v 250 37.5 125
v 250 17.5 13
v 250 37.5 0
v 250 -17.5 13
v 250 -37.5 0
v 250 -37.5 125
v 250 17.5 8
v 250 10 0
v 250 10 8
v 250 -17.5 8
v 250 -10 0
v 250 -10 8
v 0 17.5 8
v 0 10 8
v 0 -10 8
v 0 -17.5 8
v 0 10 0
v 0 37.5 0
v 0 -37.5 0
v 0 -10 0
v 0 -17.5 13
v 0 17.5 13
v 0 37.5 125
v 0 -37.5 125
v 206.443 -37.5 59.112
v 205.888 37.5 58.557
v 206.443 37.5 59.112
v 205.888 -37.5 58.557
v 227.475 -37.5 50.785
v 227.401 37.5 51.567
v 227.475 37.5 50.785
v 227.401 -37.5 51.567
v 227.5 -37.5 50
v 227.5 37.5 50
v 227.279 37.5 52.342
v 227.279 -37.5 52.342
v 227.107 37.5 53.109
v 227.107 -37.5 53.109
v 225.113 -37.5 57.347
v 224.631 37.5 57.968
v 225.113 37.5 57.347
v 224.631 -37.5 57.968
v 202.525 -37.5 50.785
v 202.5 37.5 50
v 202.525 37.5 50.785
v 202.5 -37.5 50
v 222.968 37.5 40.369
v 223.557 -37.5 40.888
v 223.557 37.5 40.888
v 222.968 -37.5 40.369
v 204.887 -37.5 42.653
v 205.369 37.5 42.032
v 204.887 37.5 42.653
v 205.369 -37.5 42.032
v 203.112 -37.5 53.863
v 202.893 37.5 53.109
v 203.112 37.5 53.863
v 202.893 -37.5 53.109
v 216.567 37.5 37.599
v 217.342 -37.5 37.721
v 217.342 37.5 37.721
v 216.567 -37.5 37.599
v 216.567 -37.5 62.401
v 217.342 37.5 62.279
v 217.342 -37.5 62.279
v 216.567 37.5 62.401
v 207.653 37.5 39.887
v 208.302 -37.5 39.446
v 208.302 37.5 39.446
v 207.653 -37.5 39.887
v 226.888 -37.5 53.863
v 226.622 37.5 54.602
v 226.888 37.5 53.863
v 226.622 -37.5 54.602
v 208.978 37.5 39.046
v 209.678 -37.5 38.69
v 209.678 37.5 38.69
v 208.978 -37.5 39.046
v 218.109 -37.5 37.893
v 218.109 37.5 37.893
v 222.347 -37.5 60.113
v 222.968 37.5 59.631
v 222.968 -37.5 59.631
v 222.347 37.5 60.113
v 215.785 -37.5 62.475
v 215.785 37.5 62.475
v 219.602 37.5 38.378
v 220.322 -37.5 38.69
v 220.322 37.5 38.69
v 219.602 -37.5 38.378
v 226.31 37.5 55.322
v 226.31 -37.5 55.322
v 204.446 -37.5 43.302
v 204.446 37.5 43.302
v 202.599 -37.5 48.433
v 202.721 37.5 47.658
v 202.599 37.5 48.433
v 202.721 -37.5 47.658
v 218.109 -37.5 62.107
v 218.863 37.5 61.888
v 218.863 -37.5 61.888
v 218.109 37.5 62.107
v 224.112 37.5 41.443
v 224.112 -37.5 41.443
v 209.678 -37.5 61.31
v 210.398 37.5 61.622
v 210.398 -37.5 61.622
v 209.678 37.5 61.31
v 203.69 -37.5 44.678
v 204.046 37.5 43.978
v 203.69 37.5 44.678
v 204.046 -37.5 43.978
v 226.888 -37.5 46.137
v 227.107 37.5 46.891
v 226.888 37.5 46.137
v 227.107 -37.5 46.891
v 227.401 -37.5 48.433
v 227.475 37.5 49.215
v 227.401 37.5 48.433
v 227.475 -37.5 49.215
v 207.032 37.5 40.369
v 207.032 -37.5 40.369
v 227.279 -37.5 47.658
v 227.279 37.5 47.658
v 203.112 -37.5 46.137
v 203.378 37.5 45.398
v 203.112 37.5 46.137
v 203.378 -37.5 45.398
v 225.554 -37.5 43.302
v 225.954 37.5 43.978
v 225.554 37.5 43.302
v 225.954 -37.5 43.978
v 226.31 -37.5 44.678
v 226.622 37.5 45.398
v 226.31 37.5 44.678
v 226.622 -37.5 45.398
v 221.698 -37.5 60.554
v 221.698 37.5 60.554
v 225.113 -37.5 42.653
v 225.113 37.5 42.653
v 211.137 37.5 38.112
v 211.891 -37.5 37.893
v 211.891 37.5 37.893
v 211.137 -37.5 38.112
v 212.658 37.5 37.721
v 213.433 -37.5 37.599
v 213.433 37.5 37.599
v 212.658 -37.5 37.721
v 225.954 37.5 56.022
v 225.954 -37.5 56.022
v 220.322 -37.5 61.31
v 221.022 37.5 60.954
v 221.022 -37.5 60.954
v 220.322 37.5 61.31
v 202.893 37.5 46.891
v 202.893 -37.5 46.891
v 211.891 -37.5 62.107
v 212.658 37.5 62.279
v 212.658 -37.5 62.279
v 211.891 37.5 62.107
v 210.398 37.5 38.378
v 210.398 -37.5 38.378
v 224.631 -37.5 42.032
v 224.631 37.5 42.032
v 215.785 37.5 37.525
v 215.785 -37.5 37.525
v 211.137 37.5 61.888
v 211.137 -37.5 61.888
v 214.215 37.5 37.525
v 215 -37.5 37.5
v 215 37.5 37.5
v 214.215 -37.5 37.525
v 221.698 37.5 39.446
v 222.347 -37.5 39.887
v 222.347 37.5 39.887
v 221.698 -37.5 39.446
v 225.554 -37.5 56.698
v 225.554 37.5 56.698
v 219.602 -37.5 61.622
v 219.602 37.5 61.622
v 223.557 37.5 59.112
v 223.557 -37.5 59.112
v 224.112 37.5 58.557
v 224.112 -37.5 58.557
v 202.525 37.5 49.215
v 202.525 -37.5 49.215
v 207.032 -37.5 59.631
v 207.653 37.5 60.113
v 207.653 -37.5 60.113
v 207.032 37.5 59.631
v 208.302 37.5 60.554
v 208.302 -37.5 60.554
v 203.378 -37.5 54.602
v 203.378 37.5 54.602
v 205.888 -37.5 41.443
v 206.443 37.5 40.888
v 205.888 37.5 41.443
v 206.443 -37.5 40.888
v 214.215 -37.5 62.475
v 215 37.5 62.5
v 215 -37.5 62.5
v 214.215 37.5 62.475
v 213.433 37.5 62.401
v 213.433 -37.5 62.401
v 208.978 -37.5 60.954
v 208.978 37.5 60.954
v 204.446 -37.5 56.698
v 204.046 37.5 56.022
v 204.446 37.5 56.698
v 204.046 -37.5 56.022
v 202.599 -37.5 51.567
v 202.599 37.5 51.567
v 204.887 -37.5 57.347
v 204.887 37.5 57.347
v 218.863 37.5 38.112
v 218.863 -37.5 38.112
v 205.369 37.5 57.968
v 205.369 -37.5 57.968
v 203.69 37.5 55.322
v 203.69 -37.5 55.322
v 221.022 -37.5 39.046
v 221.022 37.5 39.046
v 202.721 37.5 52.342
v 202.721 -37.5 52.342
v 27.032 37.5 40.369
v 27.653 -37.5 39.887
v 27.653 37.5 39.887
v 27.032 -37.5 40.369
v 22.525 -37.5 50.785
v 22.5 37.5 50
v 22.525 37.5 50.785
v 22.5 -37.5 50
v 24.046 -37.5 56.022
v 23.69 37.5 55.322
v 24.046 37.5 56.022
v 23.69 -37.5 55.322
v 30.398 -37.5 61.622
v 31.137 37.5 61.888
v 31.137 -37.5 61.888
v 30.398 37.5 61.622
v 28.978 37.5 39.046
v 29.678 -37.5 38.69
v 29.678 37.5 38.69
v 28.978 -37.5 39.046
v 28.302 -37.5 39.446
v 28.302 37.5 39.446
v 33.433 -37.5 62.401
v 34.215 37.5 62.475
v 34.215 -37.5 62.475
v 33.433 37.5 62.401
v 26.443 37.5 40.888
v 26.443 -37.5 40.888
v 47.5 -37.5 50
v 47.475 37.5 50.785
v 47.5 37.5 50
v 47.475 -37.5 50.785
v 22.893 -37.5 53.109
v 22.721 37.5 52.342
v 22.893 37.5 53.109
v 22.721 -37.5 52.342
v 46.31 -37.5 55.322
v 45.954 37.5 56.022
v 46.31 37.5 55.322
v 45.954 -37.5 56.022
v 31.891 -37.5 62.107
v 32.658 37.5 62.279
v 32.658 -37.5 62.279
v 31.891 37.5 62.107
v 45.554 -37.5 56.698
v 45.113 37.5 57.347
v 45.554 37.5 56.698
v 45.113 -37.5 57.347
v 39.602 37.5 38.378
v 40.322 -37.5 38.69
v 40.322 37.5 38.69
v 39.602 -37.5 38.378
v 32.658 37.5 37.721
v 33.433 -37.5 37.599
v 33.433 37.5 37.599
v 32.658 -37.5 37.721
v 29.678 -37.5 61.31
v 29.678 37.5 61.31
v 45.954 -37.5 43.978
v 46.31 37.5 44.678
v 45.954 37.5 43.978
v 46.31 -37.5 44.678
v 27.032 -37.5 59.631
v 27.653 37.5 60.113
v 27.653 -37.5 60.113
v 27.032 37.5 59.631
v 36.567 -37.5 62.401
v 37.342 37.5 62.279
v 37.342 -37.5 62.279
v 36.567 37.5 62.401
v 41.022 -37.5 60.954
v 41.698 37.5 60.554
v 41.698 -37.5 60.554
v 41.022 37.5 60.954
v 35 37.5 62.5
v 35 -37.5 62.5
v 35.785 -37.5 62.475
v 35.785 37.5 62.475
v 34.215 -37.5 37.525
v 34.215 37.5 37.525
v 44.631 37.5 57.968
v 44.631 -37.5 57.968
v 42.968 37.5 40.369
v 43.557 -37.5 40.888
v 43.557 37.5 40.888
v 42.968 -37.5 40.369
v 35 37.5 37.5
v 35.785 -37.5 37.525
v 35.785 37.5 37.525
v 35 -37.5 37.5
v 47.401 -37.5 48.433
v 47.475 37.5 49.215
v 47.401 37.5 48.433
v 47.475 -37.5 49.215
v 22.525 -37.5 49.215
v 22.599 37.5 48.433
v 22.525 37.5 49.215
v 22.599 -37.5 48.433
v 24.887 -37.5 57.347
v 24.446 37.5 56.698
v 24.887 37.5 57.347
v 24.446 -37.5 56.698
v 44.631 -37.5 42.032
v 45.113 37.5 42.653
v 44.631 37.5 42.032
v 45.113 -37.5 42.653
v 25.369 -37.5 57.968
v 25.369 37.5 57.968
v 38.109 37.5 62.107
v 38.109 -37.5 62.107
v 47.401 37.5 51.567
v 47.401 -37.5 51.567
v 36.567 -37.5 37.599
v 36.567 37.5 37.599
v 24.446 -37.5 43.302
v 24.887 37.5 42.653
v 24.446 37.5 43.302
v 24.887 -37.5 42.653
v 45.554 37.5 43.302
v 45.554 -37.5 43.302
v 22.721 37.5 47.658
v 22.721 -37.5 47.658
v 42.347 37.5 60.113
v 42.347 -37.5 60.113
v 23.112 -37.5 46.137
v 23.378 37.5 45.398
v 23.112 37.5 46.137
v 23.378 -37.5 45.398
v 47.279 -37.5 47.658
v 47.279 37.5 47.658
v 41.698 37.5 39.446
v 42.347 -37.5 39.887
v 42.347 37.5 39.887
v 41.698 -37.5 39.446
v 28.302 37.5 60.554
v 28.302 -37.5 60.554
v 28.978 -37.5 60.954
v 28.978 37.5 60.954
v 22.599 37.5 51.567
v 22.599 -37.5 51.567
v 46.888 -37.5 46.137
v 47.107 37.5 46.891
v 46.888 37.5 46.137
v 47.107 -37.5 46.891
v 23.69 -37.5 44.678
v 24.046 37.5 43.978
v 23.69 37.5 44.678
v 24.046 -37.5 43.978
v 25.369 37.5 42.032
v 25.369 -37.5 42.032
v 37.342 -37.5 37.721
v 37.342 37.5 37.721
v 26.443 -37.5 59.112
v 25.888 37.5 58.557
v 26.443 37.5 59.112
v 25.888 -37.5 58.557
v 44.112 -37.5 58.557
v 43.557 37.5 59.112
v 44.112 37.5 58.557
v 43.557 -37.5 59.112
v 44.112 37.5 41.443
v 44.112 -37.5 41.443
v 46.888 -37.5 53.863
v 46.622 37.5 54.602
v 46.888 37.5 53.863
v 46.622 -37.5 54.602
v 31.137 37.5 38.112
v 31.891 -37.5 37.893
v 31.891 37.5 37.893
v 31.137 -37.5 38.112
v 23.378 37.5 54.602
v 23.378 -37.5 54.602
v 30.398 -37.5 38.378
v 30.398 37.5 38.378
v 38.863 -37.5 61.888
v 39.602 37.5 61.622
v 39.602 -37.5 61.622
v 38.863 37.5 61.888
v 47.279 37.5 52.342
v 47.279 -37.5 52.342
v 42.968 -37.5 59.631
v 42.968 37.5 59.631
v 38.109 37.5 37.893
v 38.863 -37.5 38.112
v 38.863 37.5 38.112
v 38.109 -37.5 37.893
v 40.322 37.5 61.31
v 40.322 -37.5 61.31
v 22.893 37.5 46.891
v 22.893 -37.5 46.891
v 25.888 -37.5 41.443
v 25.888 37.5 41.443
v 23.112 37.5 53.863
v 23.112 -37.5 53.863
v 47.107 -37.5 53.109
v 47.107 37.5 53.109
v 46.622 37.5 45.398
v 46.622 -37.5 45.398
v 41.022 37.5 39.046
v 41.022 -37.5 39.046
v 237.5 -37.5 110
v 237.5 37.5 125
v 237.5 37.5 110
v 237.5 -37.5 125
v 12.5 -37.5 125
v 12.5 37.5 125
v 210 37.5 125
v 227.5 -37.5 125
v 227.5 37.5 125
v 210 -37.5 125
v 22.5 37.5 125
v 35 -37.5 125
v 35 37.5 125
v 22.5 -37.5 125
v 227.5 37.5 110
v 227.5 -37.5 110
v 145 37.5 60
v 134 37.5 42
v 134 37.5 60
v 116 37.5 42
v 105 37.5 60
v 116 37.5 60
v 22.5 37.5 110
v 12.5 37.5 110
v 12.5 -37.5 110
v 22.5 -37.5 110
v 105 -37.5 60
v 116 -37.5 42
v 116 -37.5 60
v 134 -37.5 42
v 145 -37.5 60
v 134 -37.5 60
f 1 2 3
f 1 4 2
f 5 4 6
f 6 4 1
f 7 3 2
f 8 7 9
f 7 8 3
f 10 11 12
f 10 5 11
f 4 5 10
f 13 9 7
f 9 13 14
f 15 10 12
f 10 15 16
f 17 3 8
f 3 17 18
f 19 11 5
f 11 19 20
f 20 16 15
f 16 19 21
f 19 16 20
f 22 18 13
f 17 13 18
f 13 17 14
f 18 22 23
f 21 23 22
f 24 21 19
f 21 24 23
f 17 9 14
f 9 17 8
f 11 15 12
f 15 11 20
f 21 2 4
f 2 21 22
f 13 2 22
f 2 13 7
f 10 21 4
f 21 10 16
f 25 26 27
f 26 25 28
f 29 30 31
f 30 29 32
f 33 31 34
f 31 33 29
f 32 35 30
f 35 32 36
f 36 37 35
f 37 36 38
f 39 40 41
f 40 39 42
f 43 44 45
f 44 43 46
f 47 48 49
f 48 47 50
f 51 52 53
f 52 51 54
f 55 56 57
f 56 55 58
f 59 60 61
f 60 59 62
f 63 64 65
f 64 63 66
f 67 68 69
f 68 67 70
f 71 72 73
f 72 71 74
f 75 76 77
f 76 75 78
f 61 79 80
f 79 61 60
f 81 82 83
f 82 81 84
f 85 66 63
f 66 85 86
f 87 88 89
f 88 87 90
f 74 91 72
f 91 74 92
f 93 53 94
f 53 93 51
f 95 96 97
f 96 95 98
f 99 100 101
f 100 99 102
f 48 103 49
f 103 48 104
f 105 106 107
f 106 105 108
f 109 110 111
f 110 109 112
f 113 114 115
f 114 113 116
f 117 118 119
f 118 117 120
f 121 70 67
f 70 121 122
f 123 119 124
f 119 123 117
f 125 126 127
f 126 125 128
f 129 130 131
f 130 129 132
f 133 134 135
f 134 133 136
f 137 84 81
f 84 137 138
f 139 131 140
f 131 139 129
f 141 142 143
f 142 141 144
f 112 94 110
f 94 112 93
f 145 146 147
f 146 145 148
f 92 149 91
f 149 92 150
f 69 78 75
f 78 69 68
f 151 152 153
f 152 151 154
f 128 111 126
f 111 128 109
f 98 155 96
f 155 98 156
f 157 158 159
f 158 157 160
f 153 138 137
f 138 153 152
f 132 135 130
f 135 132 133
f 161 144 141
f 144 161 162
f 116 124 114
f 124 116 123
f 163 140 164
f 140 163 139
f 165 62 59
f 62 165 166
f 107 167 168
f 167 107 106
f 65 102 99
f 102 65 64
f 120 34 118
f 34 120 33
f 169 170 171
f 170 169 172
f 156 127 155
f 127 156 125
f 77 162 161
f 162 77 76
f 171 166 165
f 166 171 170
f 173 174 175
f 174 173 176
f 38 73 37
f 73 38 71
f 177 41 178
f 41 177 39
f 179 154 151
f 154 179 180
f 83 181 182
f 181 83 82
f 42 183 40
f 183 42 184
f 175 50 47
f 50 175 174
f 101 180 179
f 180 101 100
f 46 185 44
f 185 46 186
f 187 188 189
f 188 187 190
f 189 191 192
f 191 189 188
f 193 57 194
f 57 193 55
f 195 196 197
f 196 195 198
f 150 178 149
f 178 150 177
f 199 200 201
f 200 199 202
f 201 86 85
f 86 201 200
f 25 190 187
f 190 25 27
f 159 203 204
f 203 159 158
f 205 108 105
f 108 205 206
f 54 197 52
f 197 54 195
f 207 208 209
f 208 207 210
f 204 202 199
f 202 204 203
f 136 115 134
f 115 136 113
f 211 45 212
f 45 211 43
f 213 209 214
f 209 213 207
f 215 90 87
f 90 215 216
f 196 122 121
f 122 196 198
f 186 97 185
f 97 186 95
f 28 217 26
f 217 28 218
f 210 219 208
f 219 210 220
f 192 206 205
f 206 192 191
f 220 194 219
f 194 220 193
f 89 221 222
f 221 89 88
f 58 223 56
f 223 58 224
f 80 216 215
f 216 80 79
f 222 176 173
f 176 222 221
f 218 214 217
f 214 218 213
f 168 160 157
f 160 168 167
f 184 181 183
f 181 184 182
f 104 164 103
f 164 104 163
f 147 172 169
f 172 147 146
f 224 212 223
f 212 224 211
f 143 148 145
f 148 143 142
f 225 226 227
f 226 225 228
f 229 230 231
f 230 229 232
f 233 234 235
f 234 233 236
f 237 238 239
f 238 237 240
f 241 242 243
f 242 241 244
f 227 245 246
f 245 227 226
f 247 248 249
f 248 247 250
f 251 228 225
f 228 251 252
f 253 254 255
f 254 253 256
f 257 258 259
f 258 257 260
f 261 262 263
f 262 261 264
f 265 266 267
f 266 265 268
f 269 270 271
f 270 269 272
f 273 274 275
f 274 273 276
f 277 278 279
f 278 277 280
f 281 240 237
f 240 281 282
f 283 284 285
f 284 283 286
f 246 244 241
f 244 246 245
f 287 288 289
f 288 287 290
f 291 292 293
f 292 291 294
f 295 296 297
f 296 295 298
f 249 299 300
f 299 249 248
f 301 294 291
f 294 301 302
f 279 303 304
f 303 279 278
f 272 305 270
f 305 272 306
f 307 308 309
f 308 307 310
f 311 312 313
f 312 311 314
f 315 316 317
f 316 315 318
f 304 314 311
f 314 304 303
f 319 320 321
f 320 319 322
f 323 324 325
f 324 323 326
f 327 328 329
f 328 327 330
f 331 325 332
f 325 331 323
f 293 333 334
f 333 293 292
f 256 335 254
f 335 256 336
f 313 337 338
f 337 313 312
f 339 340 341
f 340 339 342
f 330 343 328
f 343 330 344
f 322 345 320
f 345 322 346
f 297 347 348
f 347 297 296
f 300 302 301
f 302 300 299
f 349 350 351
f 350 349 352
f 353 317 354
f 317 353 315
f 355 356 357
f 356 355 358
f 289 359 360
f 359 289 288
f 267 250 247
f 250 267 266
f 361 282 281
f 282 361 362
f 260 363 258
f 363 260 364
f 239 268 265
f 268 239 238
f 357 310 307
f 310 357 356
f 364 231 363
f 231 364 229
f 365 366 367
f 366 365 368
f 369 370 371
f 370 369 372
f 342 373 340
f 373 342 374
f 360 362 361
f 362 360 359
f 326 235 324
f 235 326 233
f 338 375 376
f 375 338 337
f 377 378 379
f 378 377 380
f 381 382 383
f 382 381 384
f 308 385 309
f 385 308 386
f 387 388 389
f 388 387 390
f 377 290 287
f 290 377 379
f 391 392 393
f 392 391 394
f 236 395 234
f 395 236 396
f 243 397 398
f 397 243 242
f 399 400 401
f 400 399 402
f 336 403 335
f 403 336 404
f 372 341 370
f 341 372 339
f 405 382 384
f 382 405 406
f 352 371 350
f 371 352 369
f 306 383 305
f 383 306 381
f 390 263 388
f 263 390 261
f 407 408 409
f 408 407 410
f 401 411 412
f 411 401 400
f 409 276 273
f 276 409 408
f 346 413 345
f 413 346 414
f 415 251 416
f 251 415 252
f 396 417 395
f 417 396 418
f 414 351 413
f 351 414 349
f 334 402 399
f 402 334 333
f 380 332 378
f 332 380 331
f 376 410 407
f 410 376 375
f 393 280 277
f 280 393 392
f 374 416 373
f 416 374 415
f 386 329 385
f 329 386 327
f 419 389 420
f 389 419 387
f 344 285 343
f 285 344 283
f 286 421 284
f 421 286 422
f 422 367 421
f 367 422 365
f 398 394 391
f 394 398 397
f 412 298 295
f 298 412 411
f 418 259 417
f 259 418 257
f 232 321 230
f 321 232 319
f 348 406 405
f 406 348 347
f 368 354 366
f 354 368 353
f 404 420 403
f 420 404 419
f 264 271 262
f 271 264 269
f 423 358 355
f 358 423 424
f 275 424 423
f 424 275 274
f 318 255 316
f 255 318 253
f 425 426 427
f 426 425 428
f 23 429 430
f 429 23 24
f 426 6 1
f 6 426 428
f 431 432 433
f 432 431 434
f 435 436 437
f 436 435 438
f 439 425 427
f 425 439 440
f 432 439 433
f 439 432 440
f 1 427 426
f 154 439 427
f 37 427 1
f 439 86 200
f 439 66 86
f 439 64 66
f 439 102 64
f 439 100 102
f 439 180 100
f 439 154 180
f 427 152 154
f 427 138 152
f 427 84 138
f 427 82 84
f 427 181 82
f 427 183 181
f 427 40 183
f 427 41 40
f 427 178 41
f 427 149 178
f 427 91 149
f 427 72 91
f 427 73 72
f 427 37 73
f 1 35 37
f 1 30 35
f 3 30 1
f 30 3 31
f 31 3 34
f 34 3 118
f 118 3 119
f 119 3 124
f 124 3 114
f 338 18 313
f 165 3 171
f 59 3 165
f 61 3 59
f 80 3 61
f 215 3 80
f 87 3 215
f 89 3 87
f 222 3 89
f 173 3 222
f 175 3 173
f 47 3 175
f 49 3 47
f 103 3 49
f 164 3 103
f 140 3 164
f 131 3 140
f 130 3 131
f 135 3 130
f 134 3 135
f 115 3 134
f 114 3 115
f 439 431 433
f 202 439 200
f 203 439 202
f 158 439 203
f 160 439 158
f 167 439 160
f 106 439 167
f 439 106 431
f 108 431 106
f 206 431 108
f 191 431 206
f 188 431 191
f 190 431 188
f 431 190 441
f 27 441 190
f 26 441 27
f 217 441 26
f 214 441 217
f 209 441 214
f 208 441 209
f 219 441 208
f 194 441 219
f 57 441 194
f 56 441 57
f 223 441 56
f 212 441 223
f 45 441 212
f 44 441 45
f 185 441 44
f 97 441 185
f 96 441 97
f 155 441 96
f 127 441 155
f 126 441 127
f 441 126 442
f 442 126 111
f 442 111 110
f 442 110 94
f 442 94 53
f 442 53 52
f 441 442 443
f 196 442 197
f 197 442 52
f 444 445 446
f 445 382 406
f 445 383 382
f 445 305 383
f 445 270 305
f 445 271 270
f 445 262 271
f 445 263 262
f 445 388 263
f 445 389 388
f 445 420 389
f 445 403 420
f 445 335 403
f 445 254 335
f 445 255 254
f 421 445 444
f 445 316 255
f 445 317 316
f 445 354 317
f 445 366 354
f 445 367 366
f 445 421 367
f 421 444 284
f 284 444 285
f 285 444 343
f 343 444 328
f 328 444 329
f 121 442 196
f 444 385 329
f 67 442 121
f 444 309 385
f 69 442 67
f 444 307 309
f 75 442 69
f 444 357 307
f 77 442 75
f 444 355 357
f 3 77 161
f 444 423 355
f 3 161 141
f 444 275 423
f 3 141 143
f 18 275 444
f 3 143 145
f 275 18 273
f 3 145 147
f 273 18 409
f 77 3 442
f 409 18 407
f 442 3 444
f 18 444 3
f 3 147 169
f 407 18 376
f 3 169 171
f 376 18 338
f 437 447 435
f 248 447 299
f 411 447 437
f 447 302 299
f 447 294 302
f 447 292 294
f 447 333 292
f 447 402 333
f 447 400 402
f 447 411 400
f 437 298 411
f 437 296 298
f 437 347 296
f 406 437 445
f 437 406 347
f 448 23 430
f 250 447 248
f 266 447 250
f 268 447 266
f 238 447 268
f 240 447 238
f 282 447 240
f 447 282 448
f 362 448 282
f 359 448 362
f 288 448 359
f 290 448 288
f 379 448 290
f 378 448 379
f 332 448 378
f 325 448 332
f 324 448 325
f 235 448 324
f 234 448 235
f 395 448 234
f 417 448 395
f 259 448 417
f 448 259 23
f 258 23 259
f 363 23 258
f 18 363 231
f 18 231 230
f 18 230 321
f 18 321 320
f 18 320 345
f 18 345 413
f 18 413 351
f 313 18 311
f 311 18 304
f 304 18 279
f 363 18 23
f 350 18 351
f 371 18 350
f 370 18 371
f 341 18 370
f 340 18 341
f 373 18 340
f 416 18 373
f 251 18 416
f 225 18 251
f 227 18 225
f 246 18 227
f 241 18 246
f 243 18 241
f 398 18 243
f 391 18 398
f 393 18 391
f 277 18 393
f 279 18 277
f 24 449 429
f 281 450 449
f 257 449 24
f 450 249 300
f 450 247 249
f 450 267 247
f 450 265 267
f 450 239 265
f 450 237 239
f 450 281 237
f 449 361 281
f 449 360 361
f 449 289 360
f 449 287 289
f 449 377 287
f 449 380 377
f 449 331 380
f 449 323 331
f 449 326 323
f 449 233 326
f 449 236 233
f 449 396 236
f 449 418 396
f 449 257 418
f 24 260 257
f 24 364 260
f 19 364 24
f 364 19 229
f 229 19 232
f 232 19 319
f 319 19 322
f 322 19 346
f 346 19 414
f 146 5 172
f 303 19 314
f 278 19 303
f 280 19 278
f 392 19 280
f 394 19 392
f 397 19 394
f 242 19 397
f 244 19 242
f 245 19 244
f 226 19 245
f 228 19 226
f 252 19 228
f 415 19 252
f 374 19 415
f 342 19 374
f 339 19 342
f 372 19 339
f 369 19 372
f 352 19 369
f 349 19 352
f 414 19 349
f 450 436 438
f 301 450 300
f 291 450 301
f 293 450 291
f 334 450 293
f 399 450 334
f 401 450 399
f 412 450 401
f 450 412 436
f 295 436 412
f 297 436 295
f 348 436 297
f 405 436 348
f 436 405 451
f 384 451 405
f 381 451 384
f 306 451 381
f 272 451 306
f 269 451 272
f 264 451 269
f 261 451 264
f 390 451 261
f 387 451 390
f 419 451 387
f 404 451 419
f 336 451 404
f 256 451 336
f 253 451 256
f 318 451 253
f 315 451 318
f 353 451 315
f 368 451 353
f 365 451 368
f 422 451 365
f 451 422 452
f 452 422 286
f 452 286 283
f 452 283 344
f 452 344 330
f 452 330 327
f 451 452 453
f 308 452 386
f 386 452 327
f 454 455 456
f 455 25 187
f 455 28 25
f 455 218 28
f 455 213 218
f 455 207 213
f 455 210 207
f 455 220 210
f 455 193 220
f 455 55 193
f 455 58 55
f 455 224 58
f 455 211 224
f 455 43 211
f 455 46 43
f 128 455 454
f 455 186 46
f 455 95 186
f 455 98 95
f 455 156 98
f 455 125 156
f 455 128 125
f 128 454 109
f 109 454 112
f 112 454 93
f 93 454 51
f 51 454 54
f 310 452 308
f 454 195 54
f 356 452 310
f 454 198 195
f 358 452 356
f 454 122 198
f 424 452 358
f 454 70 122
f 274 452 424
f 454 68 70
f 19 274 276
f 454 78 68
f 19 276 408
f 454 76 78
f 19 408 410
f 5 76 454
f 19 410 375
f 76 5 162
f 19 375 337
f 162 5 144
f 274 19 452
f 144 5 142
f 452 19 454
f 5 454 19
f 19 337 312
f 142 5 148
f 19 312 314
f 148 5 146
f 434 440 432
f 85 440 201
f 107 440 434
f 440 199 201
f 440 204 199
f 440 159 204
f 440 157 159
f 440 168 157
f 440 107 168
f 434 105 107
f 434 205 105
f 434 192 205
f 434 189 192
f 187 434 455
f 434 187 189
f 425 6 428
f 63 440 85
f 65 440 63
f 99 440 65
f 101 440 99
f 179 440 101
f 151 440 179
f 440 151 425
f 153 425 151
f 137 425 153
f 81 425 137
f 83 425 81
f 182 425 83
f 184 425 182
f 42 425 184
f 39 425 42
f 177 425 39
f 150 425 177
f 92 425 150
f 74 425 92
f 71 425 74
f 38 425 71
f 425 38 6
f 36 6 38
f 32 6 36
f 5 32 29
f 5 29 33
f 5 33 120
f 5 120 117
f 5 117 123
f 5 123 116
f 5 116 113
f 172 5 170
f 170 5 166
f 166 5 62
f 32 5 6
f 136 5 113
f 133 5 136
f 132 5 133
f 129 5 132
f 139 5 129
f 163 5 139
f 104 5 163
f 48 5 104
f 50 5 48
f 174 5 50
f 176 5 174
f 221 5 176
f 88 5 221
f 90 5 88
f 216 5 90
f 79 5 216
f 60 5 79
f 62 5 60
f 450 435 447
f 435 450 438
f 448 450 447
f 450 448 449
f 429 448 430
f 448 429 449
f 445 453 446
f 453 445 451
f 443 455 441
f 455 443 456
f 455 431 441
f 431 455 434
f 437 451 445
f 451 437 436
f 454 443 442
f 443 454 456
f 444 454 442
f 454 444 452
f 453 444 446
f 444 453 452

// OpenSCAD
$fn=100;
mm=1; // define units
degrees=1;

include <../lib.scad>

module example_130(){
  length=250*mm;
  height=125*mm;
  width=75*mm;
  module body(){
    Cube([length,width,height],center=Y);}
  module bottom_slot(){
    depth=13;
    inset=8;
    t_width=35;
    cut_width=20;
    Cube([length,cut_width,inset],center=Y);
    translate(up(inset)){
      Cube([length,t_width,depth-inset],center=Y);}}
  module holes(){
    translate(35*X+50*Z){
      rotate(90*X){
	xpair(180,edge=true){
	  wcylinder(h=width,d=25,center=true);}}}}
  module slots(){
    outer_flat_width=35;
    inner_flat_width=40;
    module base(){
      hull(){
	translate(60*Z+length/2*X){
	  Cube([inner_flat_width,width,1],center=X+Y);}
	translate(height*Z){
	  translate(outer_flat_width*X){
	    Cube([1,width,1],center=Y);}
	  translate((length-inner_flat_width-1)*X){
	    Cube([1,width,1],center=Y);}}}}
    module inner_slot(){
      translate(length/2*X+42*Z){
	Cube([18,width,18],center=X+Y);}}
    module outer_slot(){
      depth=15;
      translate(length/2*X+(height-depth)*Z){
	xpair(length-35){
	  Cube([10,width,depth],center=X+Y);}}}
    base();
    inner_slot();
    outer_slot();}

  difference(){
    body();
    bottom_slot();
    holes();
    slots();}}

example_130();
